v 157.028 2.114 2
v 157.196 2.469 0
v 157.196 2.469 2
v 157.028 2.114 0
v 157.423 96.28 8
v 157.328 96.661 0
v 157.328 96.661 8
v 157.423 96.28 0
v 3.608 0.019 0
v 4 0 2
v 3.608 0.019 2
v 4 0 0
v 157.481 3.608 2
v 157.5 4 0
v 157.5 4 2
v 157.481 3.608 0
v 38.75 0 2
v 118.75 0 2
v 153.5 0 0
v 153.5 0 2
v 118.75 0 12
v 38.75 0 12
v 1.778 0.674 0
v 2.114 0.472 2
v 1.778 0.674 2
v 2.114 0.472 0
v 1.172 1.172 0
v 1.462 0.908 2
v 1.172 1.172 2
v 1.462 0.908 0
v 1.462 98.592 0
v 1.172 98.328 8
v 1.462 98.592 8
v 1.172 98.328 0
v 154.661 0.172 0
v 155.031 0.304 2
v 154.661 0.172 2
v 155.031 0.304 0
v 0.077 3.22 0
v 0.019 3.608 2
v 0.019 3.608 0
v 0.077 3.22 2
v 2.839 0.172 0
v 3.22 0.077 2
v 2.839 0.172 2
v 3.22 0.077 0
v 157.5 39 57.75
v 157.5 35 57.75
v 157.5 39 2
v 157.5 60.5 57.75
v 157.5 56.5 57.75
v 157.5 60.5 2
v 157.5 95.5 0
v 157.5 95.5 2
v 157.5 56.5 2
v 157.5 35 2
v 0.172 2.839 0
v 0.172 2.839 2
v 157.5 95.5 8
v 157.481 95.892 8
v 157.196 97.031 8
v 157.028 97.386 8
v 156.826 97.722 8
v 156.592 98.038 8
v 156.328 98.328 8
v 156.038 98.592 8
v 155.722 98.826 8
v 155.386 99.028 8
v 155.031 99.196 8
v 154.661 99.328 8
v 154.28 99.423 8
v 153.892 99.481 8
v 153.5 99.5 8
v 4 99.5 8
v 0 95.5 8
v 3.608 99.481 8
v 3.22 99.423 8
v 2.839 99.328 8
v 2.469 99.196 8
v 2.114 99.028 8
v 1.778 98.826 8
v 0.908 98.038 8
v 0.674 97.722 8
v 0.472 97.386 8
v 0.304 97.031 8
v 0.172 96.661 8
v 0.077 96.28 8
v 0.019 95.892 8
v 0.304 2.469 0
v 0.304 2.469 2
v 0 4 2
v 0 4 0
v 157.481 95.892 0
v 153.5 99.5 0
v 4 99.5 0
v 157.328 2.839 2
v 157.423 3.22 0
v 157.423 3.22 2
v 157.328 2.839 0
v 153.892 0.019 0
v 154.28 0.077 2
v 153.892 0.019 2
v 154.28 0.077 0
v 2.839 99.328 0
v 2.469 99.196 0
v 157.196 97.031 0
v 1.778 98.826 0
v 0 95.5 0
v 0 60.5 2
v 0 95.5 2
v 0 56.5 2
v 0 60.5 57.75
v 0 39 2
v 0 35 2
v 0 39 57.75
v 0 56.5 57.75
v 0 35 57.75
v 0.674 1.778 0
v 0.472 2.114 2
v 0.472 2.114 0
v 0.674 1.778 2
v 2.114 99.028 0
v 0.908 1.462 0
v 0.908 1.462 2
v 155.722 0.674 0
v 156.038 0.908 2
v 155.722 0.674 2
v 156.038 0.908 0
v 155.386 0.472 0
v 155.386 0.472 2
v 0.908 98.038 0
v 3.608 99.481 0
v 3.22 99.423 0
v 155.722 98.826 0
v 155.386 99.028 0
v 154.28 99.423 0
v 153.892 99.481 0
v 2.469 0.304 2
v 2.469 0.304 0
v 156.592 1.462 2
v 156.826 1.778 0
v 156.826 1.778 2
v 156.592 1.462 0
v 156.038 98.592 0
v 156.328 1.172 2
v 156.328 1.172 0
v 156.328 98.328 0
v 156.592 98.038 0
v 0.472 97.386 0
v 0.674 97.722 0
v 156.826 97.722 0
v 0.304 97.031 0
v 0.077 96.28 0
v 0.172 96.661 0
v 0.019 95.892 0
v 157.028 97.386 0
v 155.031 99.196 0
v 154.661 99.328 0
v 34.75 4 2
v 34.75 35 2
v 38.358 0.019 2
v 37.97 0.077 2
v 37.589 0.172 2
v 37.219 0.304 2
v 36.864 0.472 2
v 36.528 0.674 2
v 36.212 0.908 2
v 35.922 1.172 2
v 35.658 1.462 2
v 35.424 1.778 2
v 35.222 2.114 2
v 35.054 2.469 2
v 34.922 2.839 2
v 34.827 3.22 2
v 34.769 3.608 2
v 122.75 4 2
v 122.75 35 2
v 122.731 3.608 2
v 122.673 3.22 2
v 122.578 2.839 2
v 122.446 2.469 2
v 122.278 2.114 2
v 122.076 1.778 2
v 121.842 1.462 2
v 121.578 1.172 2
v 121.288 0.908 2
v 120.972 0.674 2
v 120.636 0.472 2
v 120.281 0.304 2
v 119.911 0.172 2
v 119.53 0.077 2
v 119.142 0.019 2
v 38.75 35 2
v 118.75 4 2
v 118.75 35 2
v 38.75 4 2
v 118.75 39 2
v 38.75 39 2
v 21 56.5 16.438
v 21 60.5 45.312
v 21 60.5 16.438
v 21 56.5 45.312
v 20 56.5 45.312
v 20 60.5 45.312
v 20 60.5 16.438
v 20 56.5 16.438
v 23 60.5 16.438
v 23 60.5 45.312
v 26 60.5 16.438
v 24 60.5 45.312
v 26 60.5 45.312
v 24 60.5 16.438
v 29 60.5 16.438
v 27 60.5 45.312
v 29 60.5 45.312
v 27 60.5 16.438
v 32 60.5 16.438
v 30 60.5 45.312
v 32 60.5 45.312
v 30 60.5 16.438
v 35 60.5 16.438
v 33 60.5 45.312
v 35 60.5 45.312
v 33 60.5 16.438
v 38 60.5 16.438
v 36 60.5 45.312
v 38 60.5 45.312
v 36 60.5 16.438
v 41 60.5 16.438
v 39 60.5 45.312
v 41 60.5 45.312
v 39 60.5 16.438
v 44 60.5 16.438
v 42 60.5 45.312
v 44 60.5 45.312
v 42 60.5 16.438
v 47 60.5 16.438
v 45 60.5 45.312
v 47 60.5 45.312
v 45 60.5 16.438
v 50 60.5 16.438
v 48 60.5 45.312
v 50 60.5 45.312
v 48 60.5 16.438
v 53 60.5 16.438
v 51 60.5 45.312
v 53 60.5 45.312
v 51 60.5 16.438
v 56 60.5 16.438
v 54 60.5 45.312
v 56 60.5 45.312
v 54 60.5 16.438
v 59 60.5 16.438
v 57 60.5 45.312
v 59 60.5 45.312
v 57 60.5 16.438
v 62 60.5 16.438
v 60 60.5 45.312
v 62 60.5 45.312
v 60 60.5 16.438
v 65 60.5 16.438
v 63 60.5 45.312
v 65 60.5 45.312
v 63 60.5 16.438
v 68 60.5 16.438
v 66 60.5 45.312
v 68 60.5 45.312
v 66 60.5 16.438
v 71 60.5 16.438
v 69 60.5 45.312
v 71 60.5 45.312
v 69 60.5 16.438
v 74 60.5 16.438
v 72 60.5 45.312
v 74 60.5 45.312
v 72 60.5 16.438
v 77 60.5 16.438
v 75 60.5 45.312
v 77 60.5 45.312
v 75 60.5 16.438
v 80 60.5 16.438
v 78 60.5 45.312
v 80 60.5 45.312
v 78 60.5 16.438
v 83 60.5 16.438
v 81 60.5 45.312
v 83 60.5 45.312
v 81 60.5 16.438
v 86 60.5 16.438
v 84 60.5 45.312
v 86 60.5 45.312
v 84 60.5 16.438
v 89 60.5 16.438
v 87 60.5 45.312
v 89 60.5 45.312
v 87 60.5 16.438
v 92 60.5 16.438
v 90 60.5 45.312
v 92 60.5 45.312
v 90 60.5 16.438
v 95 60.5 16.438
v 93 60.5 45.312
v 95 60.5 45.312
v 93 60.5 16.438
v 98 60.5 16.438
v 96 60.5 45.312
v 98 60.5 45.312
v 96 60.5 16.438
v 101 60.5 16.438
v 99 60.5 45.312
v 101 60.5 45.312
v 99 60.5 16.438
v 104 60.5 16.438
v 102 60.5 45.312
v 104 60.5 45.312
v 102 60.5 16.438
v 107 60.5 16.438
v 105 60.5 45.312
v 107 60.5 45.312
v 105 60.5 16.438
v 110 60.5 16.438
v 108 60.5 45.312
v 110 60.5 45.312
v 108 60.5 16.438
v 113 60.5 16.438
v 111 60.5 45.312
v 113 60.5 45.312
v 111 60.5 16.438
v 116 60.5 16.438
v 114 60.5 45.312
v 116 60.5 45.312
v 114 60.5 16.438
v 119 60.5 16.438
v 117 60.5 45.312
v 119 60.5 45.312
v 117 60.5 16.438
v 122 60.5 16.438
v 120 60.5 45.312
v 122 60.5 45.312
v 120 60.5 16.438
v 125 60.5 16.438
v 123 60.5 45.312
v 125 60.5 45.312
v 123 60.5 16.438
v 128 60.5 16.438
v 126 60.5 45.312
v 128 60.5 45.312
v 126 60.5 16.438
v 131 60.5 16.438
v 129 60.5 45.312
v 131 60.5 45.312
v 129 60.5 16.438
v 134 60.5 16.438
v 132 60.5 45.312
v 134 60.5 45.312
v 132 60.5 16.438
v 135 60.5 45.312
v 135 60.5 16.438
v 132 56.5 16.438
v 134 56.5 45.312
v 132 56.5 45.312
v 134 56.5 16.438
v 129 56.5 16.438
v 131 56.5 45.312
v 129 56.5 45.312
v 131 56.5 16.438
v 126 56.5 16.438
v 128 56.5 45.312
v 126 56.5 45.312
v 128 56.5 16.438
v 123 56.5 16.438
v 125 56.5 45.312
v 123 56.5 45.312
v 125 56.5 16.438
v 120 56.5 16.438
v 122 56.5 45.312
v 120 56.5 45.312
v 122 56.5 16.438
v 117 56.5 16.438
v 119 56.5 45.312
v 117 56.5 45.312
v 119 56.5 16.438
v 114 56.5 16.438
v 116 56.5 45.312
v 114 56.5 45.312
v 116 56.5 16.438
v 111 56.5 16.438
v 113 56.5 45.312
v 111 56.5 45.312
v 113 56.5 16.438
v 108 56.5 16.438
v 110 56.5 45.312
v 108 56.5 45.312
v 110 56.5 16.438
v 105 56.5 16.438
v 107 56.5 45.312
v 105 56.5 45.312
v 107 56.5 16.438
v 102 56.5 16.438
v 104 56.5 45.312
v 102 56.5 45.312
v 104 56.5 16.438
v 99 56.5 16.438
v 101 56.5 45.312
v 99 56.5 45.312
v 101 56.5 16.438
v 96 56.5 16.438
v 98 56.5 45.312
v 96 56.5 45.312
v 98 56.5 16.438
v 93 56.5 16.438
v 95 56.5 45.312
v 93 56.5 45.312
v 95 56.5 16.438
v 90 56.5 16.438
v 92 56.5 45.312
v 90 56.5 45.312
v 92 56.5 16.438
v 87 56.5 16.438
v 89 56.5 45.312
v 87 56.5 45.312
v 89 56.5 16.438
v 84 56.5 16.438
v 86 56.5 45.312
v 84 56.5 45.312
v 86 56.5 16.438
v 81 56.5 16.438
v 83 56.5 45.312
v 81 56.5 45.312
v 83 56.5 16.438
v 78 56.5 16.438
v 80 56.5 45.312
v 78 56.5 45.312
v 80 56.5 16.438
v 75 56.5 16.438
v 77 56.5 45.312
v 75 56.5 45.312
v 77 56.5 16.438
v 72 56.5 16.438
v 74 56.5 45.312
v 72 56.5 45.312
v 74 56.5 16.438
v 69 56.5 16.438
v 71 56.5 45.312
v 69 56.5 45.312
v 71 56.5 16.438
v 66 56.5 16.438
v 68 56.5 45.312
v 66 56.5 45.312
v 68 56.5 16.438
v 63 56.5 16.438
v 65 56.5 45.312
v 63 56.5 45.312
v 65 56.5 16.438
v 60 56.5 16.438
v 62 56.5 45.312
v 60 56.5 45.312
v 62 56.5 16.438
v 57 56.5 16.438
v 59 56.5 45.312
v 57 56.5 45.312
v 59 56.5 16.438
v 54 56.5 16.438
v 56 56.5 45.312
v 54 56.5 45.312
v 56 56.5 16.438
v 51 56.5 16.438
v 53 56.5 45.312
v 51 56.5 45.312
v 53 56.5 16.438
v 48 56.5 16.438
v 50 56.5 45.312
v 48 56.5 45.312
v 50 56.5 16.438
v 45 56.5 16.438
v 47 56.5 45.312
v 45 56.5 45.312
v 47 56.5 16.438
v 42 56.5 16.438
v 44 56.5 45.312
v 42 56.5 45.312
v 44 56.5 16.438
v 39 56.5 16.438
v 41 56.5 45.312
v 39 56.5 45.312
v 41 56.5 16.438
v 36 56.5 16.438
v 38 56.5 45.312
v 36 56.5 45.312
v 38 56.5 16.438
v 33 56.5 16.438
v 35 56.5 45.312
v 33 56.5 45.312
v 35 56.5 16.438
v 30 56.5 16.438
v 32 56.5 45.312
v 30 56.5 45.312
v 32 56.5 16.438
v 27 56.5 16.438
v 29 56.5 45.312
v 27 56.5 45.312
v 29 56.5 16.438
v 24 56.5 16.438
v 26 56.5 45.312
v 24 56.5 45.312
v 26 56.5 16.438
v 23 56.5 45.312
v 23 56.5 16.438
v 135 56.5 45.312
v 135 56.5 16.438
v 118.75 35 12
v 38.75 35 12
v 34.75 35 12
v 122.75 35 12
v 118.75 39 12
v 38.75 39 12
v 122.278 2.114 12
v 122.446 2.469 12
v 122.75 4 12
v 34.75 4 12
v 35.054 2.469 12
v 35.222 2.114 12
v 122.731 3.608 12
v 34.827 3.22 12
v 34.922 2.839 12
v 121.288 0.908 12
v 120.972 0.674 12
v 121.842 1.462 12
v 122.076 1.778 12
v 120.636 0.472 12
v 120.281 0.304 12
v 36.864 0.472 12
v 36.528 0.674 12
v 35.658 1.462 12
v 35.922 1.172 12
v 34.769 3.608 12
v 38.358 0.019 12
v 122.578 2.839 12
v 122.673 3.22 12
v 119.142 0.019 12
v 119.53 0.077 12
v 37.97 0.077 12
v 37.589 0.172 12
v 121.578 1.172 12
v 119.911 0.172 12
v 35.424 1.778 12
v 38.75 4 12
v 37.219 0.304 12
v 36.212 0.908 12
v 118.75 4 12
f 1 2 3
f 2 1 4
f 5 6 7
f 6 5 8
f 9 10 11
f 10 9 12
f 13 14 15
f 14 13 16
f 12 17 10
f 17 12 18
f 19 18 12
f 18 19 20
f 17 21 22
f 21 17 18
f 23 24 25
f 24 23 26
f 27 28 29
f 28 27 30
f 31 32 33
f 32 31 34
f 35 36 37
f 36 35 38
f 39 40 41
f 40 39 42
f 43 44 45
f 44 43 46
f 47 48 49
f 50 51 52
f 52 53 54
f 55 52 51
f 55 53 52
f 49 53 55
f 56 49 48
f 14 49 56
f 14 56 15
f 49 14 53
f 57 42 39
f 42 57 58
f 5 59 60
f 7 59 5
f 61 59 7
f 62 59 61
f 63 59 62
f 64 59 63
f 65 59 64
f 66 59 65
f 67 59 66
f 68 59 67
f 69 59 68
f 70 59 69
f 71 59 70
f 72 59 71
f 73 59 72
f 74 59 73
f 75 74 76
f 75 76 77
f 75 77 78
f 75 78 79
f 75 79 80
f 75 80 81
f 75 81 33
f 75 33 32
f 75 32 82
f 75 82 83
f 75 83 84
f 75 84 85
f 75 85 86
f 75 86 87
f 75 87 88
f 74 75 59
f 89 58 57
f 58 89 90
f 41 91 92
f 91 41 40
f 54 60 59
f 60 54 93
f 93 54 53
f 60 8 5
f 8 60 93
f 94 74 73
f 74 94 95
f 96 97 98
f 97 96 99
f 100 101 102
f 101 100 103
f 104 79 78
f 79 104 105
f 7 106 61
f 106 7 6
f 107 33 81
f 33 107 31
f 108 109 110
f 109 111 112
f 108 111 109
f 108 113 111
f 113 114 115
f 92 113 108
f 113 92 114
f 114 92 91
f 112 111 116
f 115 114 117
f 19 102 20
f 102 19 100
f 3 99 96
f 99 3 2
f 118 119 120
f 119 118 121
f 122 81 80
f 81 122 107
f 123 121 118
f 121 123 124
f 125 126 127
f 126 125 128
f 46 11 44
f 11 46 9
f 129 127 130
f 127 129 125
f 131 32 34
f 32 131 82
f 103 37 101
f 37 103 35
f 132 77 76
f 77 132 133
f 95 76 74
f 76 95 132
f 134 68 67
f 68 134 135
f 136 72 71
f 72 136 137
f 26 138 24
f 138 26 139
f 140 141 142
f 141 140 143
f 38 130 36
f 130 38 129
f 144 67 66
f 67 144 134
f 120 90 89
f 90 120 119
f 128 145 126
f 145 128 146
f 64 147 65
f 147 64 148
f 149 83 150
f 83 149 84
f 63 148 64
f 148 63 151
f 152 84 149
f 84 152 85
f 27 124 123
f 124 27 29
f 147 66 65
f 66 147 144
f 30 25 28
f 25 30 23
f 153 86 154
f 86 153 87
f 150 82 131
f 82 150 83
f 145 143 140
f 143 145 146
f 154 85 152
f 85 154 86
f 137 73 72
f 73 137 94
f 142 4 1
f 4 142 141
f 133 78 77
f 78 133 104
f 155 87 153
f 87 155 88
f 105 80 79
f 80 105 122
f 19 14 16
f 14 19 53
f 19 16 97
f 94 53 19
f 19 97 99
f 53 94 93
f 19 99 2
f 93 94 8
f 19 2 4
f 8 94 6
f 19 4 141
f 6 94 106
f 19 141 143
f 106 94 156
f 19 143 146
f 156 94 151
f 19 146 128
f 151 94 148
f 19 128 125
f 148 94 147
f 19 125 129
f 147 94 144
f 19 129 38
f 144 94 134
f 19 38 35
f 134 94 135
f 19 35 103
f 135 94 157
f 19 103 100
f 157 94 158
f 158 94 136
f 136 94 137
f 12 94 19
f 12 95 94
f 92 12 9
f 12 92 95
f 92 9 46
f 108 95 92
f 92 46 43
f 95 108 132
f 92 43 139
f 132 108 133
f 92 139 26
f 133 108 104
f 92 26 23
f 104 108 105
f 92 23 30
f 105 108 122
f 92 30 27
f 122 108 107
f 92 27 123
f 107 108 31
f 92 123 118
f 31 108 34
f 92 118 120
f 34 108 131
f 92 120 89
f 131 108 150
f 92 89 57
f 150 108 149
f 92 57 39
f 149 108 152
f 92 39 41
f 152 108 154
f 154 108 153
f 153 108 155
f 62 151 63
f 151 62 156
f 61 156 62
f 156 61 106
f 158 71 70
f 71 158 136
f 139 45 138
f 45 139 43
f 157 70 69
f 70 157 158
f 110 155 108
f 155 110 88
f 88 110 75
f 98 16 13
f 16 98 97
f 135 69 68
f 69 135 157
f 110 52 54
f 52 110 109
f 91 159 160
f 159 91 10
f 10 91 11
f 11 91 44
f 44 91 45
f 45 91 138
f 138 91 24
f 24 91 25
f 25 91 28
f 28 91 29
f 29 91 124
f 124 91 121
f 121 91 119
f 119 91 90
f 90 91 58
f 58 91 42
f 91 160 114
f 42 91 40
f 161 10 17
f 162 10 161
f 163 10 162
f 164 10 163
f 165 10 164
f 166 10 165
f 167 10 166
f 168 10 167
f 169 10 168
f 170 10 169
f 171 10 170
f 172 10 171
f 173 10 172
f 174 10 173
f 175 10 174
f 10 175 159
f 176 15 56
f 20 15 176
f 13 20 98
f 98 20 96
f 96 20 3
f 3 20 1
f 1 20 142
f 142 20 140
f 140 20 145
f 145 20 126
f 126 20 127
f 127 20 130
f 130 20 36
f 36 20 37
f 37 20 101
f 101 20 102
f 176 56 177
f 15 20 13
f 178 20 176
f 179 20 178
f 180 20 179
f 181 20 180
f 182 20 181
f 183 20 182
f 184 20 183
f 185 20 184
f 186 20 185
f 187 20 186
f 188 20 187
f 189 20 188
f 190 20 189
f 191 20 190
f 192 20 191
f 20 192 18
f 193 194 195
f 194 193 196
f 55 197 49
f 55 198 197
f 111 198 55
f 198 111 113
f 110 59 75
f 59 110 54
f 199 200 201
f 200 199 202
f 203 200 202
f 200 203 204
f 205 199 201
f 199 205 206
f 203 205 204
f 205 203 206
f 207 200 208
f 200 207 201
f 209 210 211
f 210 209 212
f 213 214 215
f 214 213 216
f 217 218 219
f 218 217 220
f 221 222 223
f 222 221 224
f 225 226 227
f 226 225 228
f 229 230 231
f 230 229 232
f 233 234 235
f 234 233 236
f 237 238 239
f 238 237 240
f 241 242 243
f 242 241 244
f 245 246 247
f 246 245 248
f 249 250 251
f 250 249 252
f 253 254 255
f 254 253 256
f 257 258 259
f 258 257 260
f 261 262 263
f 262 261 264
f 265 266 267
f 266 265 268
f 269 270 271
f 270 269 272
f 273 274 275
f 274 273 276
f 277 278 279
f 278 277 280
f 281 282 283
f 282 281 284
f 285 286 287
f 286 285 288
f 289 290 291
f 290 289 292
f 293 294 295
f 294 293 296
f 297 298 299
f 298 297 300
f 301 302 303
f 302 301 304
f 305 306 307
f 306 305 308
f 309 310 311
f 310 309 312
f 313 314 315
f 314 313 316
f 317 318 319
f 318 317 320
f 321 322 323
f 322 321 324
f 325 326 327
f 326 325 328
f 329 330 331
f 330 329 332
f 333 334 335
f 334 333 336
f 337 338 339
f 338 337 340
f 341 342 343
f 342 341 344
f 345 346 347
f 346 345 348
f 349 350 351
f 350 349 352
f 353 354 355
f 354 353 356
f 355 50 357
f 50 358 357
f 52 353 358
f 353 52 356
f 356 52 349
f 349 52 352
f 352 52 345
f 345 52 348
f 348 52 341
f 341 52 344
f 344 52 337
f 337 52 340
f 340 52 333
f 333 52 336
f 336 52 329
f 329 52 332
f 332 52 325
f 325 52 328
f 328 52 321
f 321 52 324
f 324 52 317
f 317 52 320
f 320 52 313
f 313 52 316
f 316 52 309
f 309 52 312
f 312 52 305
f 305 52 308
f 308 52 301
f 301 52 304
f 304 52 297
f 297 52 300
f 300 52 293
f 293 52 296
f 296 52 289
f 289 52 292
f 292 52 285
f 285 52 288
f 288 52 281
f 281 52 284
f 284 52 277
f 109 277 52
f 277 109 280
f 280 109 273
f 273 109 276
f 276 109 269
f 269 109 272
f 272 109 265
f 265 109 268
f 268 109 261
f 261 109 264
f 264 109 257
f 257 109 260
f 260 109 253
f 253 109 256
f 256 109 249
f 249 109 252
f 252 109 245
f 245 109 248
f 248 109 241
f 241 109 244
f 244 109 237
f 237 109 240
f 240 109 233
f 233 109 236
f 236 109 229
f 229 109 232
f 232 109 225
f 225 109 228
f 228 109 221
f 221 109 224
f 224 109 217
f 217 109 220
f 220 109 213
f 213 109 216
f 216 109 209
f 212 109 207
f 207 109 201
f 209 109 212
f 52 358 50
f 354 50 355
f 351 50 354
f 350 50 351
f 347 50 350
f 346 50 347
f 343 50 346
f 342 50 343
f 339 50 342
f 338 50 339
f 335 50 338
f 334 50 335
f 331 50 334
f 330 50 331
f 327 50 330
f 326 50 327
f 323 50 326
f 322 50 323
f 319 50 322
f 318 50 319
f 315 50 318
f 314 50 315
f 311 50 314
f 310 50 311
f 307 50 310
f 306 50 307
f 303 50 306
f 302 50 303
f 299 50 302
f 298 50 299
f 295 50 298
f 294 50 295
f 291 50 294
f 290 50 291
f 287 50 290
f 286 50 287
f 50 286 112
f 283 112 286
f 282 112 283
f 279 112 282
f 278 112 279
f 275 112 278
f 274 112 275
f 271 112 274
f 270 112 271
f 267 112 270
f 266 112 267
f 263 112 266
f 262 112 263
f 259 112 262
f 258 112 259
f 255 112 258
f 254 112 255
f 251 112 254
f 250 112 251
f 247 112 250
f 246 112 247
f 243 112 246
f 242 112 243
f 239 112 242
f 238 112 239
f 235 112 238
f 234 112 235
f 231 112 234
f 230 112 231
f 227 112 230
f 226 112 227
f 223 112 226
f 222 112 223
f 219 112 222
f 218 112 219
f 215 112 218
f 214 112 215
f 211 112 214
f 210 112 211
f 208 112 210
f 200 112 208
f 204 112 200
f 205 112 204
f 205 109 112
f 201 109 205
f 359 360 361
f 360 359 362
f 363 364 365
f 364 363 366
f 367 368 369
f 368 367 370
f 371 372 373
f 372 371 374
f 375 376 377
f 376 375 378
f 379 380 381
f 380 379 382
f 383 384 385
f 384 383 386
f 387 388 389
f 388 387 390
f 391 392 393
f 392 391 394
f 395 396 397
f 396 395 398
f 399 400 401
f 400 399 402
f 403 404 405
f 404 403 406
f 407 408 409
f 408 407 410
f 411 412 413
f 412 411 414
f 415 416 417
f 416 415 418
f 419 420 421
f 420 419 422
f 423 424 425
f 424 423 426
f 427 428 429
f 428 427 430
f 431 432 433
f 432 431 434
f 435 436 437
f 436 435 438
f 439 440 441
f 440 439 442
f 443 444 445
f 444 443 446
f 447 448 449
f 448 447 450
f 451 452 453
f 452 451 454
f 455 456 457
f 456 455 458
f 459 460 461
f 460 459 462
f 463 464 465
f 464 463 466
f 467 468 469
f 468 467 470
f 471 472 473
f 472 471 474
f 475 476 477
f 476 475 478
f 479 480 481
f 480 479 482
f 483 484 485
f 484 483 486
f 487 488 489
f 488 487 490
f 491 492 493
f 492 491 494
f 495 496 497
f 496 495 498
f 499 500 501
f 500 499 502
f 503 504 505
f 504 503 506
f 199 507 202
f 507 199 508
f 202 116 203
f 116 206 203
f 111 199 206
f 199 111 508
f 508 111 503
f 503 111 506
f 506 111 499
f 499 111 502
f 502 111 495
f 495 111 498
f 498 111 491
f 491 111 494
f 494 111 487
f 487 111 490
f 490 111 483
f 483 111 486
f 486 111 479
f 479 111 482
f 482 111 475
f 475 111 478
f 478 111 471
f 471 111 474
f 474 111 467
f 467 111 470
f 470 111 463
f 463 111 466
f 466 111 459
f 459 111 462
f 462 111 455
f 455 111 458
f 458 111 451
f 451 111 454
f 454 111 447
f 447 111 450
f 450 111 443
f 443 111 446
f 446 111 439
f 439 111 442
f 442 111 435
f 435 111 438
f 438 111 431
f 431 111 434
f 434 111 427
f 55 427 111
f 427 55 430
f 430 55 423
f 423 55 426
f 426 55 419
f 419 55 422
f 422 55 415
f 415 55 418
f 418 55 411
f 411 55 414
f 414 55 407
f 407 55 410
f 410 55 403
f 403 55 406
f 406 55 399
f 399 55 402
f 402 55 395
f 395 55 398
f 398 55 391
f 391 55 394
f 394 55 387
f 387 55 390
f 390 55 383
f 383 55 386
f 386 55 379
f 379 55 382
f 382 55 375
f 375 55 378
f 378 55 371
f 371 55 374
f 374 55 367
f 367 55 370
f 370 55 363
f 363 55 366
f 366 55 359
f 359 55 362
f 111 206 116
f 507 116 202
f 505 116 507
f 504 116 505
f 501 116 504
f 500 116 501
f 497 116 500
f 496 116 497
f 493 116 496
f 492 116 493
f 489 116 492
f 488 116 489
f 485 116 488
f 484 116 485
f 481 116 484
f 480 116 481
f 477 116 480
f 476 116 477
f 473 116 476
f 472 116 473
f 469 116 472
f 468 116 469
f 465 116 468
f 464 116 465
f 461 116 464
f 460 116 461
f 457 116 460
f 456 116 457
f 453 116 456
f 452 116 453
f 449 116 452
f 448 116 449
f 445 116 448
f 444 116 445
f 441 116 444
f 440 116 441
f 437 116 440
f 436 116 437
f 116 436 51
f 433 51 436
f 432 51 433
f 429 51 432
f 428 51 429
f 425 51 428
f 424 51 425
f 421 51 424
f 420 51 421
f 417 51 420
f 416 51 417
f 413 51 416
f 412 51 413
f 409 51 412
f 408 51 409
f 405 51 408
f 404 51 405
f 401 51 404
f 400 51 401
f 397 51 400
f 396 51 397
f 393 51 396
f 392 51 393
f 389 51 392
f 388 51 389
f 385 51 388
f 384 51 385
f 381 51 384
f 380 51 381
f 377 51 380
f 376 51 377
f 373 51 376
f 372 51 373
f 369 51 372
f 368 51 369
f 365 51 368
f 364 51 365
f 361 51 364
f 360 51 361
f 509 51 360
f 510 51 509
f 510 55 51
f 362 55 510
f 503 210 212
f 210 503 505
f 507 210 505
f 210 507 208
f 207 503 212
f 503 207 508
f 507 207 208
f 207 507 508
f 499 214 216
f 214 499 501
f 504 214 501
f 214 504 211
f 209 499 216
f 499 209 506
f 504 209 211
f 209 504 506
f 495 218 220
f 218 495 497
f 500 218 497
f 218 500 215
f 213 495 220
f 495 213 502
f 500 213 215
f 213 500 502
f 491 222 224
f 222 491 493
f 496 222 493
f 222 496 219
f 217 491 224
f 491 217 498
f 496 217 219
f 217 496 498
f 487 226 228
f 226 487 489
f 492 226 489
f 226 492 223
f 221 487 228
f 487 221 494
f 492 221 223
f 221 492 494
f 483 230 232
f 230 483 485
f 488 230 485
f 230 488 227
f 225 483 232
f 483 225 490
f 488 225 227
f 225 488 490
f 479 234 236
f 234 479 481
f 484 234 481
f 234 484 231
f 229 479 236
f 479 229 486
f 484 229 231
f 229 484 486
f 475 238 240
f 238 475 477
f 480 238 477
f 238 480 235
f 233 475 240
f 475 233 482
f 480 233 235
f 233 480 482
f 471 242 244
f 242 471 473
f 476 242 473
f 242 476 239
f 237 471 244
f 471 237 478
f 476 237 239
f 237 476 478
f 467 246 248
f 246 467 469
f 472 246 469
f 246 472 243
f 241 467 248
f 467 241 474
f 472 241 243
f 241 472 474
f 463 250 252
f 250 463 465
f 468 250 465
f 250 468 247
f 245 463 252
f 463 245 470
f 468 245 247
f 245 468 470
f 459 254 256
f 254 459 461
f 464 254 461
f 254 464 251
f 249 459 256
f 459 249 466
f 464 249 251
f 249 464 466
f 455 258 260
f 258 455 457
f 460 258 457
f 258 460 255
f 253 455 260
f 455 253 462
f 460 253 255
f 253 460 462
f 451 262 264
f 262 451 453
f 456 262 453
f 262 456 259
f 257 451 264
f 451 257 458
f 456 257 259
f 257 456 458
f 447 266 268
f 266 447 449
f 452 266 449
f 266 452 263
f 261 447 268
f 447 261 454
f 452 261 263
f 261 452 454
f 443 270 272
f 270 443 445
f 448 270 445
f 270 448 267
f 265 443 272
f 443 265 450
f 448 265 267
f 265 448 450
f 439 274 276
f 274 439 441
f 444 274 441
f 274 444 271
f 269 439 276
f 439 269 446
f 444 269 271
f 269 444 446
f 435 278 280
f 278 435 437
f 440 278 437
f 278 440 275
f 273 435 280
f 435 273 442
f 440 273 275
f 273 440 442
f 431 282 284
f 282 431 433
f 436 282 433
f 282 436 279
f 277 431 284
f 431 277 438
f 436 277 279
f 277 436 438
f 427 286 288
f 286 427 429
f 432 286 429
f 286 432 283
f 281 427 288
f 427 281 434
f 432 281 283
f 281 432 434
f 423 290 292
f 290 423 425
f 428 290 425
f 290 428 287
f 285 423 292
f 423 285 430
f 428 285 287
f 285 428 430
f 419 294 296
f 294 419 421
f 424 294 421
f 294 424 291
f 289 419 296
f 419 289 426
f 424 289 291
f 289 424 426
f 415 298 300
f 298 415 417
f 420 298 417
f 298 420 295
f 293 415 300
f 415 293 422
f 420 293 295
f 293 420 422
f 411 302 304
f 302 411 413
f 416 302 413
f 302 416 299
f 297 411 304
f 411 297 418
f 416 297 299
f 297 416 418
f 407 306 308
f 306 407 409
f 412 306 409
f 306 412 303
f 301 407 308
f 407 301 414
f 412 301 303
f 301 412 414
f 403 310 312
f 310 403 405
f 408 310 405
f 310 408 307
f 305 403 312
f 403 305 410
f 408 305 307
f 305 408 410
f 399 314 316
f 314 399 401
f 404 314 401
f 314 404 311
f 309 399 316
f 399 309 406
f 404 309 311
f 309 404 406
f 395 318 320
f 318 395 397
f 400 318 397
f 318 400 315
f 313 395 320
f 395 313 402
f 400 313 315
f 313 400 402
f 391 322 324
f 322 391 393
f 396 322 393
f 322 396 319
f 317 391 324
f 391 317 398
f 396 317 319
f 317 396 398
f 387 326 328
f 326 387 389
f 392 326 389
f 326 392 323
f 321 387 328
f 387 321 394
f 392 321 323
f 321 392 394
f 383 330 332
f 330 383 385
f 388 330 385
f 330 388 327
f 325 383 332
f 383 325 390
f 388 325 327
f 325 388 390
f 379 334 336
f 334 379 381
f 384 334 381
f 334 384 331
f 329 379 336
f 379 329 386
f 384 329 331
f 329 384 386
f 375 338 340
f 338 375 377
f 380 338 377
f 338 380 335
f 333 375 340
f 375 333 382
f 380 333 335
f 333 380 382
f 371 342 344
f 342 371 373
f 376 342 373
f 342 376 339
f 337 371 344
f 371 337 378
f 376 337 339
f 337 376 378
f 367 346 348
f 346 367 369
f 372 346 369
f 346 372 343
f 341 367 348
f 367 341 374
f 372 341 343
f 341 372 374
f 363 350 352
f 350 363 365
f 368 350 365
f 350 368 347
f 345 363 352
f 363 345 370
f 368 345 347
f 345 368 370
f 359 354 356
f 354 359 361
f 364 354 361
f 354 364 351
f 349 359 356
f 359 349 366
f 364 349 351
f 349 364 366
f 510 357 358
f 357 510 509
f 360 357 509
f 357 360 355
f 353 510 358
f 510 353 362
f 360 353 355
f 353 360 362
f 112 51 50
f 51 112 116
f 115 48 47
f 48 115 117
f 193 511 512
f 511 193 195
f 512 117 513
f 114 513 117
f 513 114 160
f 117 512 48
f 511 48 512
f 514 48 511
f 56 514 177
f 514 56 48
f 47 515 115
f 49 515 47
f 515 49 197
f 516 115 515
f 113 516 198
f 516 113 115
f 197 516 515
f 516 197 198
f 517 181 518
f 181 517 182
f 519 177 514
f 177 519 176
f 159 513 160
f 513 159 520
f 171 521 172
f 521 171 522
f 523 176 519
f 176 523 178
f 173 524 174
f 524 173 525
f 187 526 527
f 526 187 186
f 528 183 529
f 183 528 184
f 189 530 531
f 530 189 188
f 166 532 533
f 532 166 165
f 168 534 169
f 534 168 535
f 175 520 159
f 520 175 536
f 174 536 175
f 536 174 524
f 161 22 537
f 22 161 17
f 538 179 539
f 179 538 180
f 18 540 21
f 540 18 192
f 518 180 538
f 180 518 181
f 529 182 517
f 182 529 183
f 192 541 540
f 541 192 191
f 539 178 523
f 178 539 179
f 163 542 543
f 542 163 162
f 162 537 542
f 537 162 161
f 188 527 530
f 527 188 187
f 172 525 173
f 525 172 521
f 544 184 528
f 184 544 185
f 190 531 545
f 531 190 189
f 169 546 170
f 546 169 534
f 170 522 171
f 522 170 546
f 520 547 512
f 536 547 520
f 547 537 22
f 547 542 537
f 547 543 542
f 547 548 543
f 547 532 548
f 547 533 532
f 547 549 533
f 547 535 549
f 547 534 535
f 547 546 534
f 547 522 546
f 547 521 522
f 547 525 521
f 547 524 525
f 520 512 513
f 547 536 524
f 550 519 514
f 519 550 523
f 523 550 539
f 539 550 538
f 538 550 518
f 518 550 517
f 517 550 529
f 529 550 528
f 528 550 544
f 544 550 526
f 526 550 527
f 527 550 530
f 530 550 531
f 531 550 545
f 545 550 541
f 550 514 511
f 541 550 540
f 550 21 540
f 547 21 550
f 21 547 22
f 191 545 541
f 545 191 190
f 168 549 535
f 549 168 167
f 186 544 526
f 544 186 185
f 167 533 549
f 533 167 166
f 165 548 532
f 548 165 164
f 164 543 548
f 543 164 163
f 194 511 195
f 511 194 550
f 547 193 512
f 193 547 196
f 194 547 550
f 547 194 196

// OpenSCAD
//Laptop size


// ThinkPad X1 Yoga Gen 7
laptop_length = 315;
laptop_width = 17.5;
laptop_height = 223;


// ThinkPad T14 Gen 1 to Gen 4 and T490
/*
laptop_length = 329;
laptop_width = 20;
laptop_height = 227;
*/

// Dock size

// ThinkPad Universal Thunderbolt 4 Dock and
// ThinkPad Universal Thunderbolt 3 Dock 40AC
dock_length = 80;
dock_width = 31;
dock_height = 10;


// ThinkPad USB-C Dock 40A9
/*
dock_length = 80;
dock_width = 34;
dock_height = 10;
*/

// Power adapter
adapter_width = 35;

// Margin and corner radius
margin = 4;
dock_case_lenght = dock_length+2*margin;
dock_case_width = dock_width+2*margin;
dock_case_heigth = dock_height+margin/2;

laptop_case_lenght = laptop_length*0.5;
laptop_case_width = laptop_width+2*margin;
laptop_case_heigth = laptop_height*0.25+margin/2;

// increase for smoother corners
segments = 64;


// ========================
// Rounded rectangle module
// ========================
module rounded_rect(x, y, radius) {
    minkowski() {
        square([x - 2*radius, y - 2*radius], center = false);
        circle(r = radius, $fn = segments);
    }
}

module laptop() {
    difference() {
            // Outer shell (walls included)  
            translate([0, 0, 0])
                cube([laptop_case_lenght, laptop_case_width, laptop_case_heigth]);

            translate([0, margin, margin/2])
                cube([laptop_length, laptop_width, laptop_height]);
        
            // Vents
            vents_side_margin = 20;
            vents_width = laptop_case_lenght - 2*vents_side_margin;
            translate([vents_side_margin, laptop_width+margin, laptop_case_heigth/4])
            {
                vent_width = 1;
                vent_margin = 2;
                vents = (vents_width/(vent_width+vent_margin))-1;
                for (v = [0 : vents]) {
                    translate([v*(vent_width+vent_margin), 0, margin/2])
                        cube([vent_width, margin, laptop_case_heigth/2]);
                }
           }
    }
}

module dock() {
    difference() {
            // Outer shell (walls included)
            translate([margin, margin, 0])
                linear_extrude(height = dock_case_heigth)
                    rounded_rect(dock_case_lenght, dock_case_width, margin);

            translate([margin, margin, dock_case_heigth-dock_height])
                cube([dock_length, dock_width, dock_height]);
    }
}

module base() {
    difference() {
        base_width = dock_width+laptop_width+adapter_width+4*margin;
        translate([margin, margin, 0])
            linear_extrude(height = margin*2)
                rounded_rect(laptop_case_lenght, base_width, margin);
        
        translate([0, 0, margin/2])
            cube([laptop_case_lenght, base_width-margin, margin*2]);
    }
}

base();

translate([0, dock_case_width-margin, 0])
    laptop();

translate([(laptop_case_lenght-dock_case_lenght)/2, 0, 0])
    dock();
